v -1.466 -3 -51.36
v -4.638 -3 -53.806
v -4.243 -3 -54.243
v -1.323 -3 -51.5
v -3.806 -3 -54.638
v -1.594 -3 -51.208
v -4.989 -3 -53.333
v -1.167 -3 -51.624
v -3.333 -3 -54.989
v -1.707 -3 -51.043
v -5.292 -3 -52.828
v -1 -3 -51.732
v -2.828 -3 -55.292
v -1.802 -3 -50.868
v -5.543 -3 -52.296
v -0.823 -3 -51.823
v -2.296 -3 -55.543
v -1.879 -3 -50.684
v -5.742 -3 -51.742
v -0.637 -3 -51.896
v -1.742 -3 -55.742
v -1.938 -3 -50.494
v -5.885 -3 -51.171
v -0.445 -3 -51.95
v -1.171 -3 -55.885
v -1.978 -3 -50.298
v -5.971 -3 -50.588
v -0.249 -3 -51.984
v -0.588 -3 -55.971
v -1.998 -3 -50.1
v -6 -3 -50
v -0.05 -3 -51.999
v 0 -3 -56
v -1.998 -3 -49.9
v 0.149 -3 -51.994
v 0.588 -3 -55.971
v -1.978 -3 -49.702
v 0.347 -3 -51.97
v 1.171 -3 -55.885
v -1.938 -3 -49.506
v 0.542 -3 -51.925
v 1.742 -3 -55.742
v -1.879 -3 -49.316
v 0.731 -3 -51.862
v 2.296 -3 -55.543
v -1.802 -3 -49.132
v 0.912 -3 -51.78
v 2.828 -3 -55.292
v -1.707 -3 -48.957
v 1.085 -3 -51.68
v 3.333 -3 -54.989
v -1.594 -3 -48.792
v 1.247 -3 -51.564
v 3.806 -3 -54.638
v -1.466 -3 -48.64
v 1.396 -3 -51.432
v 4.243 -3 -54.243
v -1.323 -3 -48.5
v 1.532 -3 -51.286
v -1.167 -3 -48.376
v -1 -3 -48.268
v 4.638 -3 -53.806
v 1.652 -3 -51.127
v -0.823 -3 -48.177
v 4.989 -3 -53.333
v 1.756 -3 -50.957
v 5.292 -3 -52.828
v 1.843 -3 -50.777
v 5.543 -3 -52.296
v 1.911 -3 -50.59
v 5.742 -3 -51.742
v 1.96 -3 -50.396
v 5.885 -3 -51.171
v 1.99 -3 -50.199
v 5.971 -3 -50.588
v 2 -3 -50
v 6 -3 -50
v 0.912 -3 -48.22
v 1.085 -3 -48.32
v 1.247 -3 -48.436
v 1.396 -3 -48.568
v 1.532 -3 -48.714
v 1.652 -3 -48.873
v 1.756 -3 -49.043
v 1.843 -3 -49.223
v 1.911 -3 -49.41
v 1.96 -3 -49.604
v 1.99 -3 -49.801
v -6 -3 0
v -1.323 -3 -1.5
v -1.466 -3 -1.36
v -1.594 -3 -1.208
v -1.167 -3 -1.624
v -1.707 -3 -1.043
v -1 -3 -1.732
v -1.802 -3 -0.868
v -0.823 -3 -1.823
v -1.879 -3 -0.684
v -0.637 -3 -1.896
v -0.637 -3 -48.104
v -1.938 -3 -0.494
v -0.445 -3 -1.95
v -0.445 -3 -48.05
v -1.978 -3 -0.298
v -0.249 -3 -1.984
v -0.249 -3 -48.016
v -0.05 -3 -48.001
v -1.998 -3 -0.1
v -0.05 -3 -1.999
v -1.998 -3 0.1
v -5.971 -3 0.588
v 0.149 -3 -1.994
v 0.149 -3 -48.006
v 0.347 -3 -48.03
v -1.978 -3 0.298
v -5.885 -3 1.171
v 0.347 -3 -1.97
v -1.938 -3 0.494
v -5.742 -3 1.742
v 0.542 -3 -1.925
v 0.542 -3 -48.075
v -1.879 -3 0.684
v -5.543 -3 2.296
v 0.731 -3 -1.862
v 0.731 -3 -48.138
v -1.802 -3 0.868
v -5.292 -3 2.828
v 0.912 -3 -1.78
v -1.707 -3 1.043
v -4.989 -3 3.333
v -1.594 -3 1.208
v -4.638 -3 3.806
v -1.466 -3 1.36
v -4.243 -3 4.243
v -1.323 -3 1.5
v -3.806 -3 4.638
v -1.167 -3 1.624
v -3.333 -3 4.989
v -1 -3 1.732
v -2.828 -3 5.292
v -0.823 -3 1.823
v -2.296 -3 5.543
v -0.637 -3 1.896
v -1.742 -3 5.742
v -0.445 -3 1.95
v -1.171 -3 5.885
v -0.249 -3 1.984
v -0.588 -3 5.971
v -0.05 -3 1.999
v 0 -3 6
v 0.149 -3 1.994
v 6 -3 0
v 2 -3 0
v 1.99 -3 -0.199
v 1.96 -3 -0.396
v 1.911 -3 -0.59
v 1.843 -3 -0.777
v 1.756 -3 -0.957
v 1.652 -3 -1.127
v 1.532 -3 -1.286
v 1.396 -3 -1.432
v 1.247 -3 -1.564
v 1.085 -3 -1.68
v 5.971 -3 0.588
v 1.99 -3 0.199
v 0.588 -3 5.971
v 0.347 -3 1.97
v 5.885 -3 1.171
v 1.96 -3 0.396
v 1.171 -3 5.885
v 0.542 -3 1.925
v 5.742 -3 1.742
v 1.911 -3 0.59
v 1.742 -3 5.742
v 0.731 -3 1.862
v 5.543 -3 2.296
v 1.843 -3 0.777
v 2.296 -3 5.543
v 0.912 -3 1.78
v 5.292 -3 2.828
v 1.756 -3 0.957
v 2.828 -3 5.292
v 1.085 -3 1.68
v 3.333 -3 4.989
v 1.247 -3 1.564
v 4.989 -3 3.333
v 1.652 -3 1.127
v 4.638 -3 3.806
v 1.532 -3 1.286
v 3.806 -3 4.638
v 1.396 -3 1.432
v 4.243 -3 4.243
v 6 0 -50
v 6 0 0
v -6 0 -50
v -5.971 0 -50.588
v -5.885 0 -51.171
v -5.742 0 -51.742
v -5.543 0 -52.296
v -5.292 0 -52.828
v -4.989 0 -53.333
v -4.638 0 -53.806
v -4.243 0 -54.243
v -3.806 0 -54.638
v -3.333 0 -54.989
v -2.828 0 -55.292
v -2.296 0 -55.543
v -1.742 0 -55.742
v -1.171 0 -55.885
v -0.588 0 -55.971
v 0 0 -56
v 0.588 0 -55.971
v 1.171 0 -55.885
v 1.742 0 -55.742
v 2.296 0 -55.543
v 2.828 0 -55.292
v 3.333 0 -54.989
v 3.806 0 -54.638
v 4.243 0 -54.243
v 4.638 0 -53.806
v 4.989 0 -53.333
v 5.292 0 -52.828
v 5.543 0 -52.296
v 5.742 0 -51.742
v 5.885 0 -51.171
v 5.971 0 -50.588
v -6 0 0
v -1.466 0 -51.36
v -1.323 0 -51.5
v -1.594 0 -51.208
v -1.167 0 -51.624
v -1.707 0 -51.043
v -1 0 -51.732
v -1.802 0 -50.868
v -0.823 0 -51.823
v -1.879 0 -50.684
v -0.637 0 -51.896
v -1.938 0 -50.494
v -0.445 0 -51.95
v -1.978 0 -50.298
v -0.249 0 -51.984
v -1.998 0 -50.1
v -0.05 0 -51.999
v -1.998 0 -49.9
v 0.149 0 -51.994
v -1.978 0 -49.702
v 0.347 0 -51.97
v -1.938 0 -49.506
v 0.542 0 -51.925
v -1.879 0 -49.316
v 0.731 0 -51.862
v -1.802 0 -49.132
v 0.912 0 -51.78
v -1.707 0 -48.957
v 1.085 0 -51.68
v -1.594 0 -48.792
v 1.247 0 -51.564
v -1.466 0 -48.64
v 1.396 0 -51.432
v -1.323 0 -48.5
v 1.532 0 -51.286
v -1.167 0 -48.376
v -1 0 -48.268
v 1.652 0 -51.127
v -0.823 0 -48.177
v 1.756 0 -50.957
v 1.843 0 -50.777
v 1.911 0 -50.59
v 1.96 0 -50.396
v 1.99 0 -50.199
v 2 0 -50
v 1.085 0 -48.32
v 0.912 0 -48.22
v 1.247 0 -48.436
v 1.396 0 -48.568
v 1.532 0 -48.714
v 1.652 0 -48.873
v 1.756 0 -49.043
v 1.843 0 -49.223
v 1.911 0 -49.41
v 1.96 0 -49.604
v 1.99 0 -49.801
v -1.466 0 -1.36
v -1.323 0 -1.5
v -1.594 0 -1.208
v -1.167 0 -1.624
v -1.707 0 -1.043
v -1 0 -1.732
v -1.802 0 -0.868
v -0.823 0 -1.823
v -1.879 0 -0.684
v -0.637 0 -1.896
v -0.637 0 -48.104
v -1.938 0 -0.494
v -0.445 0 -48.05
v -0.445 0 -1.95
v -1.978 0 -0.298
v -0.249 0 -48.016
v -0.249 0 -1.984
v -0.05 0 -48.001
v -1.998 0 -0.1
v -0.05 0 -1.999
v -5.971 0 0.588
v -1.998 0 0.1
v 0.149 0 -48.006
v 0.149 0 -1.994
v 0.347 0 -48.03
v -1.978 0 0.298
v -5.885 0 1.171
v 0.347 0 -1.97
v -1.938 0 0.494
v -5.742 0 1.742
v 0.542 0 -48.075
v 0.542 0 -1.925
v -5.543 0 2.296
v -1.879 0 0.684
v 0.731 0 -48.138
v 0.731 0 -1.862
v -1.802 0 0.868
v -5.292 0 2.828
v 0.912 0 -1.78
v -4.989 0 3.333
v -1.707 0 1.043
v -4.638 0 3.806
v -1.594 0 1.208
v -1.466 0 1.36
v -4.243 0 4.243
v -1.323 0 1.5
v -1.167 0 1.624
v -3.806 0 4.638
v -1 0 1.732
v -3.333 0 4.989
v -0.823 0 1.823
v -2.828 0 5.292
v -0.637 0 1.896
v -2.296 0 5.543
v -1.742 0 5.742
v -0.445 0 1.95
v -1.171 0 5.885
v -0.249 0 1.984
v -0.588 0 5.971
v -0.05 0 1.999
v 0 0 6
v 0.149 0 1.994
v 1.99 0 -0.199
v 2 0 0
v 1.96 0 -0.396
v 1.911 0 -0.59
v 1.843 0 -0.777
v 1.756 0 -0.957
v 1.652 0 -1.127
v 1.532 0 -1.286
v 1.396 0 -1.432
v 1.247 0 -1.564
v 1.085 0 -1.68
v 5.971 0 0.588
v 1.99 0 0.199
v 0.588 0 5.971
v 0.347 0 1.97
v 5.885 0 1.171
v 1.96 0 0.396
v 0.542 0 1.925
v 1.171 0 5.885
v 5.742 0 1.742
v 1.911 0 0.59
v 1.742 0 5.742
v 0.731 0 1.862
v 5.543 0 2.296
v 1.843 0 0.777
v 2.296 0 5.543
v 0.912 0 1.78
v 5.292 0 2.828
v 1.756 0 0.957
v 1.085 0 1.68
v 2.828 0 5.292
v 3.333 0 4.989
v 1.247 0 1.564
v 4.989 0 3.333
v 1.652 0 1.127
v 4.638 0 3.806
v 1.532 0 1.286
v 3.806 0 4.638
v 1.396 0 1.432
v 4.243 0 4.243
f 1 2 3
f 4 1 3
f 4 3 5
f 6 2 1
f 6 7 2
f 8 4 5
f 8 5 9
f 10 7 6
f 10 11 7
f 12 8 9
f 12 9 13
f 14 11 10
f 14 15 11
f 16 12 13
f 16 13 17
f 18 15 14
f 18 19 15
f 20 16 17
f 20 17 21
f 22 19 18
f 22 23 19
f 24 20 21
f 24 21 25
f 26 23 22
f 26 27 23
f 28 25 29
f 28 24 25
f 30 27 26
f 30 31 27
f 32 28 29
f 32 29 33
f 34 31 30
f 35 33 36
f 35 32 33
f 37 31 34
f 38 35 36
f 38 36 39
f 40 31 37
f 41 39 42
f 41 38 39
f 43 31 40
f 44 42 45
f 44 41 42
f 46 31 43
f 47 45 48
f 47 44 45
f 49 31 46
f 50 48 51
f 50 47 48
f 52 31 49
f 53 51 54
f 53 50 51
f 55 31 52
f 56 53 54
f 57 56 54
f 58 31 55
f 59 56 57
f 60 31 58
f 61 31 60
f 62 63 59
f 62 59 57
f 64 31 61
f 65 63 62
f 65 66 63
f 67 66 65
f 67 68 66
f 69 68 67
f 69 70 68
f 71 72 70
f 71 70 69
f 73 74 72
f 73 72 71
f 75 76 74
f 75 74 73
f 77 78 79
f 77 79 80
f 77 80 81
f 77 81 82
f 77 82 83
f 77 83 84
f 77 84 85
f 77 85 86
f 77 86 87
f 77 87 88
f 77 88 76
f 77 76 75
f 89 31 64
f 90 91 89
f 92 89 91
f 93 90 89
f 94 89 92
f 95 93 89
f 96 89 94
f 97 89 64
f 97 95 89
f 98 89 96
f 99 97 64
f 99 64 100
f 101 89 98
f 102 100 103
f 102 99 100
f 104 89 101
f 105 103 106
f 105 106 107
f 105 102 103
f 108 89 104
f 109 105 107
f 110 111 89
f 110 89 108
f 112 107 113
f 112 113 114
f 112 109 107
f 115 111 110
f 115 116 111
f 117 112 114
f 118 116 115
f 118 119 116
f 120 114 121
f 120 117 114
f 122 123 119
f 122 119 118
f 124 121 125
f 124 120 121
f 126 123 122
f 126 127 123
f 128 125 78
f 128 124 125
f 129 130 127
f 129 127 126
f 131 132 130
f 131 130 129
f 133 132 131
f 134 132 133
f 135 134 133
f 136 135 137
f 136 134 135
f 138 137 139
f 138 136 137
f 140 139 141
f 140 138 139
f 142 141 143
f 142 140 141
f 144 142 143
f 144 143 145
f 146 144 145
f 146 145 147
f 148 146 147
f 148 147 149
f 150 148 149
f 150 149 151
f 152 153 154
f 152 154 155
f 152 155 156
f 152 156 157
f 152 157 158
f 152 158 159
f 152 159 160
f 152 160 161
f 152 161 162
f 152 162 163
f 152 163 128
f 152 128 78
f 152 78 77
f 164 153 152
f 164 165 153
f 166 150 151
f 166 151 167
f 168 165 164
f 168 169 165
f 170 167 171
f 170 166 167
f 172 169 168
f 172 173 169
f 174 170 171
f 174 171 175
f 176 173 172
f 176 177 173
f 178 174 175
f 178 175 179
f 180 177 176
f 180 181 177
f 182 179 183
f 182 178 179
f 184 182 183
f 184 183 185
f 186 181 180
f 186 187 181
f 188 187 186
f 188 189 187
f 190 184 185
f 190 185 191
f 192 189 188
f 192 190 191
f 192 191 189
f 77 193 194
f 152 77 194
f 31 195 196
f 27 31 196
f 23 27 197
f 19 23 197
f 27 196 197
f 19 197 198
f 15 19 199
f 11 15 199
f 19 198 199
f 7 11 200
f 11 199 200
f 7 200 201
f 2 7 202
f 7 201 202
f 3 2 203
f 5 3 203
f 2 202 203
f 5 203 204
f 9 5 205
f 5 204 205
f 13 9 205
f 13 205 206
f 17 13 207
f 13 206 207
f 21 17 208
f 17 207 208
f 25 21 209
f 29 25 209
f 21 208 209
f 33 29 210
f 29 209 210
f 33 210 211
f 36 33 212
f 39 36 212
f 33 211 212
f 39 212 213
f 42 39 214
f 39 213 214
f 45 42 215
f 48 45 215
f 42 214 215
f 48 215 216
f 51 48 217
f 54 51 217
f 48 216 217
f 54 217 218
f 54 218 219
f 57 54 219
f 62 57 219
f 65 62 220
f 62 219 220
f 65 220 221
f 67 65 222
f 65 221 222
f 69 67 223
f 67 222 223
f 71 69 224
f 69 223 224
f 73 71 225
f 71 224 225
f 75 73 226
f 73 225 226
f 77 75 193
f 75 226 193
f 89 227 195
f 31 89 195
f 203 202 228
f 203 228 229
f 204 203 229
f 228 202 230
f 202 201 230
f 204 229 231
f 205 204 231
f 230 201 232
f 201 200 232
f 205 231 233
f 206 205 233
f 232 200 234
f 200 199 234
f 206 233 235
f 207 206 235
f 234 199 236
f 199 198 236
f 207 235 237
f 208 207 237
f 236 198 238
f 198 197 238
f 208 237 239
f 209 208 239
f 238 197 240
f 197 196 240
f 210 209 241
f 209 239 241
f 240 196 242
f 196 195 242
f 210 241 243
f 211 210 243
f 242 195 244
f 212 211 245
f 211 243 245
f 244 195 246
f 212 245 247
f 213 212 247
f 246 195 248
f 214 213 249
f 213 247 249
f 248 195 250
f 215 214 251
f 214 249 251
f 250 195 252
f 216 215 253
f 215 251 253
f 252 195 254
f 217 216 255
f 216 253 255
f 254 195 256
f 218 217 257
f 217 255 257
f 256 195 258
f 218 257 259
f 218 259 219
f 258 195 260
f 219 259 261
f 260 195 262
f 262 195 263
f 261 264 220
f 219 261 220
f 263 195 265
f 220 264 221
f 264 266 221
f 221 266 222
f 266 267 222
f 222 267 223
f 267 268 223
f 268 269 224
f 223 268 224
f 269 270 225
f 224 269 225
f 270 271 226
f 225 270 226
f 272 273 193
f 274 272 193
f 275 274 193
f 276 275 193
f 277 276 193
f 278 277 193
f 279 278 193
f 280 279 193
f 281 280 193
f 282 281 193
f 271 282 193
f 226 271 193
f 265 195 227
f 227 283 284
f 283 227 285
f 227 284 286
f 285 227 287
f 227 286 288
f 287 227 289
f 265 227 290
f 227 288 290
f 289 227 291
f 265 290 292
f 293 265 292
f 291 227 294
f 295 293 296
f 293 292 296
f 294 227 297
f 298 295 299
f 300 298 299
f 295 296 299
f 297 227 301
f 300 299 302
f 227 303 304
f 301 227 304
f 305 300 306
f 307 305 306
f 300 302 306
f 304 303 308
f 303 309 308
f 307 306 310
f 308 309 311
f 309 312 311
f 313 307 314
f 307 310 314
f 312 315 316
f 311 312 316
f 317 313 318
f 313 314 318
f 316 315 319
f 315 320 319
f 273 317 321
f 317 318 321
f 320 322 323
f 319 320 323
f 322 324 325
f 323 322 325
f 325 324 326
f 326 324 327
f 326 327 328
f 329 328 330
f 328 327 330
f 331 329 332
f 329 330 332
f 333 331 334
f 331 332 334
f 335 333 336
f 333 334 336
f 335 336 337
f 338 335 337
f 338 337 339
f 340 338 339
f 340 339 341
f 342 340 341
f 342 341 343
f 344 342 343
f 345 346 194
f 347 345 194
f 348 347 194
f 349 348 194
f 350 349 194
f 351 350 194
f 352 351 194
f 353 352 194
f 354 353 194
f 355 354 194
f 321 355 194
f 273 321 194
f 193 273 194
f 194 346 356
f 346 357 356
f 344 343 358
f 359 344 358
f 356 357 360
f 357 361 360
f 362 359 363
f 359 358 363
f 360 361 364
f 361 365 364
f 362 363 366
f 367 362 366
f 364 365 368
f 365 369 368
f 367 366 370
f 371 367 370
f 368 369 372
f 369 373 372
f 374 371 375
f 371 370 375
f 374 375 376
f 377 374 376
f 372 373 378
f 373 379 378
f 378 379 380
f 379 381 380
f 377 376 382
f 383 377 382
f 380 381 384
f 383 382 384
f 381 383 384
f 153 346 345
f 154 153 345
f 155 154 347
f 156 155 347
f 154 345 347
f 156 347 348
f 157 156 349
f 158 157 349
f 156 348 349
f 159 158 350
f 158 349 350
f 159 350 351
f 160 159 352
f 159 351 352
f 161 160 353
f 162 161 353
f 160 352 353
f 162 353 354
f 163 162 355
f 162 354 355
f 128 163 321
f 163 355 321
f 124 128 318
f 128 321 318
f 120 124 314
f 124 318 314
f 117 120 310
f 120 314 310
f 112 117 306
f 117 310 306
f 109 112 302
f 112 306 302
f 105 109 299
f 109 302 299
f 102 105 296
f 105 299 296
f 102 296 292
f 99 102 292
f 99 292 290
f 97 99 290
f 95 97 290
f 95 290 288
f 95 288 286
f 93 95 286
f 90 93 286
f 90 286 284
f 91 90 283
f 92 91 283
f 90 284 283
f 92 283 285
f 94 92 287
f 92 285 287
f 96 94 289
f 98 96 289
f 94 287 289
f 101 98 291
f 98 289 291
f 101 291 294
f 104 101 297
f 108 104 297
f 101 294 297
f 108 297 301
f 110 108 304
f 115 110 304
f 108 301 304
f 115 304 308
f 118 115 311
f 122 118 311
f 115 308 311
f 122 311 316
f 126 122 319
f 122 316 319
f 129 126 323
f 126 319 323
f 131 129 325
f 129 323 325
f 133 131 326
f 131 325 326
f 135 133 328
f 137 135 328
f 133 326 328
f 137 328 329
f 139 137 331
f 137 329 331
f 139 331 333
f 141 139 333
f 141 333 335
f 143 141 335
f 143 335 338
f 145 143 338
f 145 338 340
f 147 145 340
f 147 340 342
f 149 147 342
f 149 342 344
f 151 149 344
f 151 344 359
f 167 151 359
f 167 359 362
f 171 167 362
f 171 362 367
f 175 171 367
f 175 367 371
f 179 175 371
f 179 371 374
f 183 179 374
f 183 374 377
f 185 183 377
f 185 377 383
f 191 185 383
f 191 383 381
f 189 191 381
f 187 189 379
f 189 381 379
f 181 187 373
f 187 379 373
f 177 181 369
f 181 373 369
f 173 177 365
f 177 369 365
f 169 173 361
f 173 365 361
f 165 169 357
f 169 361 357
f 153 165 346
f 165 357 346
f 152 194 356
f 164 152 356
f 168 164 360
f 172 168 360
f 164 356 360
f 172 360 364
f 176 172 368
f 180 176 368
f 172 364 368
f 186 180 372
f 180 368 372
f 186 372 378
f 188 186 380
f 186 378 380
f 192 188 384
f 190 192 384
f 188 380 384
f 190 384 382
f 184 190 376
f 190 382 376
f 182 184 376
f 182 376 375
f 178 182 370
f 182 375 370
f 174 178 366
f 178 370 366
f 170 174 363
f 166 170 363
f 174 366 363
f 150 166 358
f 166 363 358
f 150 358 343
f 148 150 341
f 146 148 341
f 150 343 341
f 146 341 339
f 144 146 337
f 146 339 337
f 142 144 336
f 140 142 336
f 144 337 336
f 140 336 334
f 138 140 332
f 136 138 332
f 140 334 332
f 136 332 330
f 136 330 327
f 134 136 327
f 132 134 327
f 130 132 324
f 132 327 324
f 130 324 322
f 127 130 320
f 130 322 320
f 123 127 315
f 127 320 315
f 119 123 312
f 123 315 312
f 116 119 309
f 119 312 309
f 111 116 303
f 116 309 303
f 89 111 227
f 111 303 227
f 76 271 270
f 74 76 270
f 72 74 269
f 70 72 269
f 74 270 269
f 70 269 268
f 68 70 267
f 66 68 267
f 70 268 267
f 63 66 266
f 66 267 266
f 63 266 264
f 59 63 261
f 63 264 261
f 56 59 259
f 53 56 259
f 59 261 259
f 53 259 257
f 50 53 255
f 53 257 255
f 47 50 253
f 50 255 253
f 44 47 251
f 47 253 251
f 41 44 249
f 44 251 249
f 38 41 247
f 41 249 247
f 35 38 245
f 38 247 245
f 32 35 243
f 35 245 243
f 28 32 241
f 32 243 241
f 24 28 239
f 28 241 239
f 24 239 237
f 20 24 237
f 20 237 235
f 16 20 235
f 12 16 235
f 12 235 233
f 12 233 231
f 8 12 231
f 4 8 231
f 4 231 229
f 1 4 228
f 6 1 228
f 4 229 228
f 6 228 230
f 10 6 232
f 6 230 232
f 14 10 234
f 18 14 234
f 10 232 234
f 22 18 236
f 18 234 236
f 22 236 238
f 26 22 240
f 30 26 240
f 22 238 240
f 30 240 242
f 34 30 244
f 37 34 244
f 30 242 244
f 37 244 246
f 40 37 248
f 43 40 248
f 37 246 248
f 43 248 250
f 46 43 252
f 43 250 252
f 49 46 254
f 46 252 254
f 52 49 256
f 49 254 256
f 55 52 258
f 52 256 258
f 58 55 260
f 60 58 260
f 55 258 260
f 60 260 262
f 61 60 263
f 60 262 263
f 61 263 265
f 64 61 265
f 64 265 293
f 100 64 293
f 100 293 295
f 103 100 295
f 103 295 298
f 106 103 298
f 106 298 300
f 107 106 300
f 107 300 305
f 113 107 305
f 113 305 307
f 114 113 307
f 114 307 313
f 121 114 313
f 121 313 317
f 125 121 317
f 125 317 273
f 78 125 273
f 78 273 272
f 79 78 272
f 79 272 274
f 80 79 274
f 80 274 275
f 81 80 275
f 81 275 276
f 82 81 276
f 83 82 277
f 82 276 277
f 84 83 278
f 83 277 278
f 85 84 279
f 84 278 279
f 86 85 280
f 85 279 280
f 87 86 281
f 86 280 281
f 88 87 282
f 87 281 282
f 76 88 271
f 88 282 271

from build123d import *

# Parameters (mm, degrees)
F1_DEPTH = 3


with BuildPart() as f1:
    # F0 (on Front) → F1 (new body)
    with BuildSketch(Plane.XZ):
        with BuildLine():
            Line((2, 0), (6, 0))
            ThreePointArc((6, 0), (0, 6), (-6, 0))
            Line((-6, 0), (-2, 0))
            ThreePointArc((-2, 0), (0, 2), (2, 0))
        make_face()
        with BuildLine():
            Line((6, -50), (6, 0))
            ThreePointArc((6, 0), (0, -6), (-6, 0))
            Line((-6, 0), (-6, -50))
            ThreePointArc((-6, -50), (0, -44), (6, -50))
        make_face()
        with BuildLine():
            ThreePointArc((-6, 0), (0, -6), (6, 0))
            Line((6, 0), (2, 0))
            ThreePointArc((2, 0), (0, -2), (-2, 0))
            Line((-2, 0), (-6, 0))
        make_face()
        with BuildLine():
            Line((2, -50), (6, -50))
            ThreePointArc((6, -50), (0, -44), (-6, -50))
            Line((-6, -50), (-2, -50))
            ThreePointArc((-2, -50), (0, -48), (2, -50))
        make_face()
        with BuildLine():
            ThreePointArc((-6, -50), (0, -56), (6, -50))
            Line((6, -50), (2, -50))
            ThreePointArc((2, -50), (0, -52), (-2, -50))
            Line((-2, -50), (-6, -50))
        make_face()
    extrude(amount=F1_DEPTH)


solid = f1.part
